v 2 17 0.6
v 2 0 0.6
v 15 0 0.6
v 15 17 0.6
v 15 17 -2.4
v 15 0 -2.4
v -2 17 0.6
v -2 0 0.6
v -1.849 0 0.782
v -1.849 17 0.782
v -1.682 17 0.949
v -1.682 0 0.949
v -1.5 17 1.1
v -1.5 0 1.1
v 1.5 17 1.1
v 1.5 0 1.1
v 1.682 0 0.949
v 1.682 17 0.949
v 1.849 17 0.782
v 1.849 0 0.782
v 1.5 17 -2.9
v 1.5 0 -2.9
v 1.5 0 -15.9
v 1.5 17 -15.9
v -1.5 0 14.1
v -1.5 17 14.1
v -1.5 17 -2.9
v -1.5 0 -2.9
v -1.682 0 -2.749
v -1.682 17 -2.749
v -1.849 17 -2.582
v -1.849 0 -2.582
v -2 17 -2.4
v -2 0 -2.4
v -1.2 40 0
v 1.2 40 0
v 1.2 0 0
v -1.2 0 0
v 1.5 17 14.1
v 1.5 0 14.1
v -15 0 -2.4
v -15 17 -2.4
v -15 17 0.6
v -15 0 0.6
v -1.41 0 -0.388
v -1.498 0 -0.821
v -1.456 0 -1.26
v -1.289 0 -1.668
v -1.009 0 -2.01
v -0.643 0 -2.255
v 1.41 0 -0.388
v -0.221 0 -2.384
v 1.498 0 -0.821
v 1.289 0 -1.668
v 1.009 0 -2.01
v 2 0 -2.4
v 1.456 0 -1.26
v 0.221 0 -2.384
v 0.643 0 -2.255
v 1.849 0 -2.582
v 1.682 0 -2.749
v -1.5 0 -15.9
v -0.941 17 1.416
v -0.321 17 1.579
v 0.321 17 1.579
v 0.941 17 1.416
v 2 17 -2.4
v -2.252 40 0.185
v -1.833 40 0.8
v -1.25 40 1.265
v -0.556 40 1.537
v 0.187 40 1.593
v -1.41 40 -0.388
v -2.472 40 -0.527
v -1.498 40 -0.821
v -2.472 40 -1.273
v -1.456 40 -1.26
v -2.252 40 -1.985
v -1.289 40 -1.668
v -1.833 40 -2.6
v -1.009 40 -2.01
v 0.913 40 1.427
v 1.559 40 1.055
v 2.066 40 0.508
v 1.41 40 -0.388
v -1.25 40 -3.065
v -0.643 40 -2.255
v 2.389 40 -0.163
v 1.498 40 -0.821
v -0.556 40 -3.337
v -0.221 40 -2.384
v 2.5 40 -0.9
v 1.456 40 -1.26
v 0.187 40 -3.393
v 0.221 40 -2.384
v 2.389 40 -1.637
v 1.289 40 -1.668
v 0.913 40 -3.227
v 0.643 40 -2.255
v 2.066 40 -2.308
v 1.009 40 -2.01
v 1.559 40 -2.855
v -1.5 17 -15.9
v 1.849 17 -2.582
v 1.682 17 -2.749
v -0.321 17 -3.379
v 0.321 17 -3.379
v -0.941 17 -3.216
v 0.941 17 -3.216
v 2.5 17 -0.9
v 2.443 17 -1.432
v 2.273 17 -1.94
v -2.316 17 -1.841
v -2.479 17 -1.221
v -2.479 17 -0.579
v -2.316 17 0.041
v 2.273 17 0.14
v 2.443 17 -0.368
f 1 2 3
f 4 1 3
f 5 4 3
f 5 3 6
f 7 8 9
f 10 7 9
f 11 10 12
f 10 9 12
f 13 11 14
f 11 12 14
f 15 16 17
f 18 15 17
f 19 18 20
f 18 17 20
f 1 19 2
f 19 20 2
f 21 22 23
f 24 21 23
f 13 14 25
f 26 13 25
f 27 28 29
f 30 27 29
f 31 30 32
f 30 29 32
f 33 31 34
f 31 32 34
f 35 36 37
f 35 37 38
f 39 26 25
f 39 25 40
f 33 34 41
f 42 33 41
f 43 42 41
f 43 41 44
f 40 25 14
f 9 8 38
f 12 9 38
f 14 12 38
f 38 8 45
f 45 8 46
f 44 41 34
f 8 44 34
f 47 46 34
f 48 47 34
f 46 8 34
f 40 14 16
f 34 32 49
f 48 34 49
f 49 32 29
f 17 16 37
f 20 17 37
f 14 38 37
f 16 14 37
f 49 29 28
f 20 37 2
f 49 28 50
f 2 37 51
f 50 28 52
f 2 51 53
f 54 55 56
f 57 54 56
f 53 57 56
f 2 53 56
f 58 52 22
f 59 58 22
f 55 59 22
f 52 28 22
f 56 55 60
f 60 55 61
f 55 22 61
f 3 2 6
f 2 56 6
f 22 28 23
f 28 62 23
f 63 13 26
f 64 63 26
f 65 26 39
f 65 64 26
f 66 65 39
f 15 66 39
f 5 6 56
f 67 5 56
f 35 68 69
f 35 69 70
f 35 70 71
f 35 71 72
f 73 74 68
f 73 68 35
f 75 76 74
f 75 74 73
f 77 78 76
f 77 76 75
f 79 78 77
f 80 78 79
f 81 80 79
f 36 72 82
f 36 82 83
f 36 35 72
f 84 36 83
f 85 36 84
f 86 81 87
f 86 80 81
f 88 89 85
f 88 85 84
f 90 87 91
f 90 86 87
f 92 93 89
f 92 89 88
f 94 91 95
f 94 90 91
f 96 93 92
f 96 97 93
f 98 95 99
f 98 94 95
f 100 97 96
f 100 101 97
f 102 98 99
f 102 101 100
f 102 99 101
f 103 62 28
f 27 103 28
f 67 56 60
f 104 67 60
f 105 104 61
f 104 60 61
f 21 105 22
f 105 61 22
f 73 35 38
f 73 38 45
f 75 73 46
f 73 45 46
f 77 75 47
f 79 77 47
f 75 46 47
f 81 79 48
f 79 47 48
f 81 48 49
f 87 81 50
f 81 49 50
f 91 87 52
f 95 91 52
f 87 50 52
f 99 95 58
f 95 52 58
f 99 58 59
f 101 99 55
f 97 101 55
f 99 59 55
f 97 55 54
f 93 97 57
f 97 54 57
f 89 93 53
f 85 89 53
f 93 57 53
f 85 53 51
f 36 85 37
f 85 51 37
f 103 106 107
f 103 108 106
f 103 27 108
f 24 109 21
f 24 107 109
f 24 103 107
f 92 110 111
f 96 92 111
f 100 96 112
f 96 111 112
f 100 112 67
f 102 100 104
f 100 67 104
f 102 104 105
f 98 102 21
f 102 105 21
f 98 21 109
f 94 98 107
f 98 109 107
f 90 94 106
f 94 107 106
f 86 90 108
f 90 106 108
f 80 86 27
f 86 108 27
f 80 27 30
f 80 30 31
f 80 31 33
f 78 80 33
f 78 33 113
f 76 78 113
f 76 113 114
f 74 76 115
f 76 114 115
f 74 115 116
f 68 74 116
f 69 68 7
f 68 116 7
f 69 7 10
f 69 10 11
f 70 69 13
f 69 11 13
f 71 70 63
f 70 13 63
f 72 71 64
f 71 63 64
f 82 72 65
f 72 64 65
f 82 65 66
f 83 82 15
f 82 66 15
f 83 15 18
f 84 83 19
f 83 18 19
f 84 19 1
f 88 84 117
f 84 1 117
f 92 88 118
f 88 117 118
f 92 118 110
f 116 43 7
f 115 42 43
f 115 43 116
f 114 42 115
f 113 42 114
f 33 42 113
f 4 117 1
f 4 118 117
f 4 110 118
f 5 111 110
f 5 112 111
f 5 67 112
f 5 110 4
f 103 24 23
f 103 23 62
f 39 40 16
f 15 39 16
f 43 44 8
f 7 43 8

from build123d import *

# Parameters (mm, degrees)
BOSS_EXTRUDE1_DEPTH = 17
SKETCH1_3_R         = 2.5
BOSS_EXTRUDE2_DEPTH = 40


with BuildPart() as part:
    # Sketch1 → Boss-Extrude1 (new body)
    with BuildSketch(Plane(origin=(0, 0, 0), x_dir=(1, 0, 0), z_dir=(0, 1, 0))):
        with BuildLine():
            ThreePointArc((1.5, -1.1), (1.767766953, -0.867766953), (2, -0.6))
            Line((2, -0.6), (15, -0.6))
            Line((15, -0.6), (15, 2.4))
            Line((15, 2.4), (2, 2.4))
            ThreePointArc((2, 2.4), (1.767766953, 2.667766953), (1.5, 2.9))
            Line((1.5, 2.9), (1.5, 15.9))
            Line((1.5, 15.9), (-1.5, 15.9))
            Line((-1.5, 15.9), (-1.5, 2.9))
            ThreePointArc((-1.5, 2.9), (-1.767766953, 2.667766953), (-2, 2.4))
            Line((-2, 2.4), (-15, 2.4))
            Line((-15, 2.4), (-15, -0.6))
            Line((-15, -0.6), (-2, -0.6))
            ThreePointArc((-2, -0.6), (-1.767766953, -0.867766953), (-1.5, -1.1))
            Line((-1.5, -1.1), (-1.5, -14.1))
            Line((-1.5, -14.1), (1.5, -14.1))
            Line((1.5, -14.1), (1.5, -1.1))
        make_face()
        with BuildLine():
            ThreePointArc((-1.2, 0), (0, 2.4), (1.2, 0))
            Line((1.2, 0), (-1.2, 0))
        make_face(mode=Mode.SUBTRACT)
    extrude(amount=BOSS_EXTRUDE1_DEPTH)

    # Sketch1<3> → Boss-Extrude2 (add)
    with BuildSketch(Plane(origin=(0, 0, 0), x_dir=(1, 0, 0), z_dir=(0, 1, 0))):
        with Locations((0, 0.9)):
            Circle(SKETCH1_3_R)
        with BuildLine():
            ThreePointArc((-1.2, 0), (0, 2.4), (1.2, 0))
            Line((1.2, 0), (-1.2, 0))
        make_face(mode=Mode.SUBTRACT)
    extrude(amount=BOSS_EXTRUDE2_DEPTH)


solid = part.part
